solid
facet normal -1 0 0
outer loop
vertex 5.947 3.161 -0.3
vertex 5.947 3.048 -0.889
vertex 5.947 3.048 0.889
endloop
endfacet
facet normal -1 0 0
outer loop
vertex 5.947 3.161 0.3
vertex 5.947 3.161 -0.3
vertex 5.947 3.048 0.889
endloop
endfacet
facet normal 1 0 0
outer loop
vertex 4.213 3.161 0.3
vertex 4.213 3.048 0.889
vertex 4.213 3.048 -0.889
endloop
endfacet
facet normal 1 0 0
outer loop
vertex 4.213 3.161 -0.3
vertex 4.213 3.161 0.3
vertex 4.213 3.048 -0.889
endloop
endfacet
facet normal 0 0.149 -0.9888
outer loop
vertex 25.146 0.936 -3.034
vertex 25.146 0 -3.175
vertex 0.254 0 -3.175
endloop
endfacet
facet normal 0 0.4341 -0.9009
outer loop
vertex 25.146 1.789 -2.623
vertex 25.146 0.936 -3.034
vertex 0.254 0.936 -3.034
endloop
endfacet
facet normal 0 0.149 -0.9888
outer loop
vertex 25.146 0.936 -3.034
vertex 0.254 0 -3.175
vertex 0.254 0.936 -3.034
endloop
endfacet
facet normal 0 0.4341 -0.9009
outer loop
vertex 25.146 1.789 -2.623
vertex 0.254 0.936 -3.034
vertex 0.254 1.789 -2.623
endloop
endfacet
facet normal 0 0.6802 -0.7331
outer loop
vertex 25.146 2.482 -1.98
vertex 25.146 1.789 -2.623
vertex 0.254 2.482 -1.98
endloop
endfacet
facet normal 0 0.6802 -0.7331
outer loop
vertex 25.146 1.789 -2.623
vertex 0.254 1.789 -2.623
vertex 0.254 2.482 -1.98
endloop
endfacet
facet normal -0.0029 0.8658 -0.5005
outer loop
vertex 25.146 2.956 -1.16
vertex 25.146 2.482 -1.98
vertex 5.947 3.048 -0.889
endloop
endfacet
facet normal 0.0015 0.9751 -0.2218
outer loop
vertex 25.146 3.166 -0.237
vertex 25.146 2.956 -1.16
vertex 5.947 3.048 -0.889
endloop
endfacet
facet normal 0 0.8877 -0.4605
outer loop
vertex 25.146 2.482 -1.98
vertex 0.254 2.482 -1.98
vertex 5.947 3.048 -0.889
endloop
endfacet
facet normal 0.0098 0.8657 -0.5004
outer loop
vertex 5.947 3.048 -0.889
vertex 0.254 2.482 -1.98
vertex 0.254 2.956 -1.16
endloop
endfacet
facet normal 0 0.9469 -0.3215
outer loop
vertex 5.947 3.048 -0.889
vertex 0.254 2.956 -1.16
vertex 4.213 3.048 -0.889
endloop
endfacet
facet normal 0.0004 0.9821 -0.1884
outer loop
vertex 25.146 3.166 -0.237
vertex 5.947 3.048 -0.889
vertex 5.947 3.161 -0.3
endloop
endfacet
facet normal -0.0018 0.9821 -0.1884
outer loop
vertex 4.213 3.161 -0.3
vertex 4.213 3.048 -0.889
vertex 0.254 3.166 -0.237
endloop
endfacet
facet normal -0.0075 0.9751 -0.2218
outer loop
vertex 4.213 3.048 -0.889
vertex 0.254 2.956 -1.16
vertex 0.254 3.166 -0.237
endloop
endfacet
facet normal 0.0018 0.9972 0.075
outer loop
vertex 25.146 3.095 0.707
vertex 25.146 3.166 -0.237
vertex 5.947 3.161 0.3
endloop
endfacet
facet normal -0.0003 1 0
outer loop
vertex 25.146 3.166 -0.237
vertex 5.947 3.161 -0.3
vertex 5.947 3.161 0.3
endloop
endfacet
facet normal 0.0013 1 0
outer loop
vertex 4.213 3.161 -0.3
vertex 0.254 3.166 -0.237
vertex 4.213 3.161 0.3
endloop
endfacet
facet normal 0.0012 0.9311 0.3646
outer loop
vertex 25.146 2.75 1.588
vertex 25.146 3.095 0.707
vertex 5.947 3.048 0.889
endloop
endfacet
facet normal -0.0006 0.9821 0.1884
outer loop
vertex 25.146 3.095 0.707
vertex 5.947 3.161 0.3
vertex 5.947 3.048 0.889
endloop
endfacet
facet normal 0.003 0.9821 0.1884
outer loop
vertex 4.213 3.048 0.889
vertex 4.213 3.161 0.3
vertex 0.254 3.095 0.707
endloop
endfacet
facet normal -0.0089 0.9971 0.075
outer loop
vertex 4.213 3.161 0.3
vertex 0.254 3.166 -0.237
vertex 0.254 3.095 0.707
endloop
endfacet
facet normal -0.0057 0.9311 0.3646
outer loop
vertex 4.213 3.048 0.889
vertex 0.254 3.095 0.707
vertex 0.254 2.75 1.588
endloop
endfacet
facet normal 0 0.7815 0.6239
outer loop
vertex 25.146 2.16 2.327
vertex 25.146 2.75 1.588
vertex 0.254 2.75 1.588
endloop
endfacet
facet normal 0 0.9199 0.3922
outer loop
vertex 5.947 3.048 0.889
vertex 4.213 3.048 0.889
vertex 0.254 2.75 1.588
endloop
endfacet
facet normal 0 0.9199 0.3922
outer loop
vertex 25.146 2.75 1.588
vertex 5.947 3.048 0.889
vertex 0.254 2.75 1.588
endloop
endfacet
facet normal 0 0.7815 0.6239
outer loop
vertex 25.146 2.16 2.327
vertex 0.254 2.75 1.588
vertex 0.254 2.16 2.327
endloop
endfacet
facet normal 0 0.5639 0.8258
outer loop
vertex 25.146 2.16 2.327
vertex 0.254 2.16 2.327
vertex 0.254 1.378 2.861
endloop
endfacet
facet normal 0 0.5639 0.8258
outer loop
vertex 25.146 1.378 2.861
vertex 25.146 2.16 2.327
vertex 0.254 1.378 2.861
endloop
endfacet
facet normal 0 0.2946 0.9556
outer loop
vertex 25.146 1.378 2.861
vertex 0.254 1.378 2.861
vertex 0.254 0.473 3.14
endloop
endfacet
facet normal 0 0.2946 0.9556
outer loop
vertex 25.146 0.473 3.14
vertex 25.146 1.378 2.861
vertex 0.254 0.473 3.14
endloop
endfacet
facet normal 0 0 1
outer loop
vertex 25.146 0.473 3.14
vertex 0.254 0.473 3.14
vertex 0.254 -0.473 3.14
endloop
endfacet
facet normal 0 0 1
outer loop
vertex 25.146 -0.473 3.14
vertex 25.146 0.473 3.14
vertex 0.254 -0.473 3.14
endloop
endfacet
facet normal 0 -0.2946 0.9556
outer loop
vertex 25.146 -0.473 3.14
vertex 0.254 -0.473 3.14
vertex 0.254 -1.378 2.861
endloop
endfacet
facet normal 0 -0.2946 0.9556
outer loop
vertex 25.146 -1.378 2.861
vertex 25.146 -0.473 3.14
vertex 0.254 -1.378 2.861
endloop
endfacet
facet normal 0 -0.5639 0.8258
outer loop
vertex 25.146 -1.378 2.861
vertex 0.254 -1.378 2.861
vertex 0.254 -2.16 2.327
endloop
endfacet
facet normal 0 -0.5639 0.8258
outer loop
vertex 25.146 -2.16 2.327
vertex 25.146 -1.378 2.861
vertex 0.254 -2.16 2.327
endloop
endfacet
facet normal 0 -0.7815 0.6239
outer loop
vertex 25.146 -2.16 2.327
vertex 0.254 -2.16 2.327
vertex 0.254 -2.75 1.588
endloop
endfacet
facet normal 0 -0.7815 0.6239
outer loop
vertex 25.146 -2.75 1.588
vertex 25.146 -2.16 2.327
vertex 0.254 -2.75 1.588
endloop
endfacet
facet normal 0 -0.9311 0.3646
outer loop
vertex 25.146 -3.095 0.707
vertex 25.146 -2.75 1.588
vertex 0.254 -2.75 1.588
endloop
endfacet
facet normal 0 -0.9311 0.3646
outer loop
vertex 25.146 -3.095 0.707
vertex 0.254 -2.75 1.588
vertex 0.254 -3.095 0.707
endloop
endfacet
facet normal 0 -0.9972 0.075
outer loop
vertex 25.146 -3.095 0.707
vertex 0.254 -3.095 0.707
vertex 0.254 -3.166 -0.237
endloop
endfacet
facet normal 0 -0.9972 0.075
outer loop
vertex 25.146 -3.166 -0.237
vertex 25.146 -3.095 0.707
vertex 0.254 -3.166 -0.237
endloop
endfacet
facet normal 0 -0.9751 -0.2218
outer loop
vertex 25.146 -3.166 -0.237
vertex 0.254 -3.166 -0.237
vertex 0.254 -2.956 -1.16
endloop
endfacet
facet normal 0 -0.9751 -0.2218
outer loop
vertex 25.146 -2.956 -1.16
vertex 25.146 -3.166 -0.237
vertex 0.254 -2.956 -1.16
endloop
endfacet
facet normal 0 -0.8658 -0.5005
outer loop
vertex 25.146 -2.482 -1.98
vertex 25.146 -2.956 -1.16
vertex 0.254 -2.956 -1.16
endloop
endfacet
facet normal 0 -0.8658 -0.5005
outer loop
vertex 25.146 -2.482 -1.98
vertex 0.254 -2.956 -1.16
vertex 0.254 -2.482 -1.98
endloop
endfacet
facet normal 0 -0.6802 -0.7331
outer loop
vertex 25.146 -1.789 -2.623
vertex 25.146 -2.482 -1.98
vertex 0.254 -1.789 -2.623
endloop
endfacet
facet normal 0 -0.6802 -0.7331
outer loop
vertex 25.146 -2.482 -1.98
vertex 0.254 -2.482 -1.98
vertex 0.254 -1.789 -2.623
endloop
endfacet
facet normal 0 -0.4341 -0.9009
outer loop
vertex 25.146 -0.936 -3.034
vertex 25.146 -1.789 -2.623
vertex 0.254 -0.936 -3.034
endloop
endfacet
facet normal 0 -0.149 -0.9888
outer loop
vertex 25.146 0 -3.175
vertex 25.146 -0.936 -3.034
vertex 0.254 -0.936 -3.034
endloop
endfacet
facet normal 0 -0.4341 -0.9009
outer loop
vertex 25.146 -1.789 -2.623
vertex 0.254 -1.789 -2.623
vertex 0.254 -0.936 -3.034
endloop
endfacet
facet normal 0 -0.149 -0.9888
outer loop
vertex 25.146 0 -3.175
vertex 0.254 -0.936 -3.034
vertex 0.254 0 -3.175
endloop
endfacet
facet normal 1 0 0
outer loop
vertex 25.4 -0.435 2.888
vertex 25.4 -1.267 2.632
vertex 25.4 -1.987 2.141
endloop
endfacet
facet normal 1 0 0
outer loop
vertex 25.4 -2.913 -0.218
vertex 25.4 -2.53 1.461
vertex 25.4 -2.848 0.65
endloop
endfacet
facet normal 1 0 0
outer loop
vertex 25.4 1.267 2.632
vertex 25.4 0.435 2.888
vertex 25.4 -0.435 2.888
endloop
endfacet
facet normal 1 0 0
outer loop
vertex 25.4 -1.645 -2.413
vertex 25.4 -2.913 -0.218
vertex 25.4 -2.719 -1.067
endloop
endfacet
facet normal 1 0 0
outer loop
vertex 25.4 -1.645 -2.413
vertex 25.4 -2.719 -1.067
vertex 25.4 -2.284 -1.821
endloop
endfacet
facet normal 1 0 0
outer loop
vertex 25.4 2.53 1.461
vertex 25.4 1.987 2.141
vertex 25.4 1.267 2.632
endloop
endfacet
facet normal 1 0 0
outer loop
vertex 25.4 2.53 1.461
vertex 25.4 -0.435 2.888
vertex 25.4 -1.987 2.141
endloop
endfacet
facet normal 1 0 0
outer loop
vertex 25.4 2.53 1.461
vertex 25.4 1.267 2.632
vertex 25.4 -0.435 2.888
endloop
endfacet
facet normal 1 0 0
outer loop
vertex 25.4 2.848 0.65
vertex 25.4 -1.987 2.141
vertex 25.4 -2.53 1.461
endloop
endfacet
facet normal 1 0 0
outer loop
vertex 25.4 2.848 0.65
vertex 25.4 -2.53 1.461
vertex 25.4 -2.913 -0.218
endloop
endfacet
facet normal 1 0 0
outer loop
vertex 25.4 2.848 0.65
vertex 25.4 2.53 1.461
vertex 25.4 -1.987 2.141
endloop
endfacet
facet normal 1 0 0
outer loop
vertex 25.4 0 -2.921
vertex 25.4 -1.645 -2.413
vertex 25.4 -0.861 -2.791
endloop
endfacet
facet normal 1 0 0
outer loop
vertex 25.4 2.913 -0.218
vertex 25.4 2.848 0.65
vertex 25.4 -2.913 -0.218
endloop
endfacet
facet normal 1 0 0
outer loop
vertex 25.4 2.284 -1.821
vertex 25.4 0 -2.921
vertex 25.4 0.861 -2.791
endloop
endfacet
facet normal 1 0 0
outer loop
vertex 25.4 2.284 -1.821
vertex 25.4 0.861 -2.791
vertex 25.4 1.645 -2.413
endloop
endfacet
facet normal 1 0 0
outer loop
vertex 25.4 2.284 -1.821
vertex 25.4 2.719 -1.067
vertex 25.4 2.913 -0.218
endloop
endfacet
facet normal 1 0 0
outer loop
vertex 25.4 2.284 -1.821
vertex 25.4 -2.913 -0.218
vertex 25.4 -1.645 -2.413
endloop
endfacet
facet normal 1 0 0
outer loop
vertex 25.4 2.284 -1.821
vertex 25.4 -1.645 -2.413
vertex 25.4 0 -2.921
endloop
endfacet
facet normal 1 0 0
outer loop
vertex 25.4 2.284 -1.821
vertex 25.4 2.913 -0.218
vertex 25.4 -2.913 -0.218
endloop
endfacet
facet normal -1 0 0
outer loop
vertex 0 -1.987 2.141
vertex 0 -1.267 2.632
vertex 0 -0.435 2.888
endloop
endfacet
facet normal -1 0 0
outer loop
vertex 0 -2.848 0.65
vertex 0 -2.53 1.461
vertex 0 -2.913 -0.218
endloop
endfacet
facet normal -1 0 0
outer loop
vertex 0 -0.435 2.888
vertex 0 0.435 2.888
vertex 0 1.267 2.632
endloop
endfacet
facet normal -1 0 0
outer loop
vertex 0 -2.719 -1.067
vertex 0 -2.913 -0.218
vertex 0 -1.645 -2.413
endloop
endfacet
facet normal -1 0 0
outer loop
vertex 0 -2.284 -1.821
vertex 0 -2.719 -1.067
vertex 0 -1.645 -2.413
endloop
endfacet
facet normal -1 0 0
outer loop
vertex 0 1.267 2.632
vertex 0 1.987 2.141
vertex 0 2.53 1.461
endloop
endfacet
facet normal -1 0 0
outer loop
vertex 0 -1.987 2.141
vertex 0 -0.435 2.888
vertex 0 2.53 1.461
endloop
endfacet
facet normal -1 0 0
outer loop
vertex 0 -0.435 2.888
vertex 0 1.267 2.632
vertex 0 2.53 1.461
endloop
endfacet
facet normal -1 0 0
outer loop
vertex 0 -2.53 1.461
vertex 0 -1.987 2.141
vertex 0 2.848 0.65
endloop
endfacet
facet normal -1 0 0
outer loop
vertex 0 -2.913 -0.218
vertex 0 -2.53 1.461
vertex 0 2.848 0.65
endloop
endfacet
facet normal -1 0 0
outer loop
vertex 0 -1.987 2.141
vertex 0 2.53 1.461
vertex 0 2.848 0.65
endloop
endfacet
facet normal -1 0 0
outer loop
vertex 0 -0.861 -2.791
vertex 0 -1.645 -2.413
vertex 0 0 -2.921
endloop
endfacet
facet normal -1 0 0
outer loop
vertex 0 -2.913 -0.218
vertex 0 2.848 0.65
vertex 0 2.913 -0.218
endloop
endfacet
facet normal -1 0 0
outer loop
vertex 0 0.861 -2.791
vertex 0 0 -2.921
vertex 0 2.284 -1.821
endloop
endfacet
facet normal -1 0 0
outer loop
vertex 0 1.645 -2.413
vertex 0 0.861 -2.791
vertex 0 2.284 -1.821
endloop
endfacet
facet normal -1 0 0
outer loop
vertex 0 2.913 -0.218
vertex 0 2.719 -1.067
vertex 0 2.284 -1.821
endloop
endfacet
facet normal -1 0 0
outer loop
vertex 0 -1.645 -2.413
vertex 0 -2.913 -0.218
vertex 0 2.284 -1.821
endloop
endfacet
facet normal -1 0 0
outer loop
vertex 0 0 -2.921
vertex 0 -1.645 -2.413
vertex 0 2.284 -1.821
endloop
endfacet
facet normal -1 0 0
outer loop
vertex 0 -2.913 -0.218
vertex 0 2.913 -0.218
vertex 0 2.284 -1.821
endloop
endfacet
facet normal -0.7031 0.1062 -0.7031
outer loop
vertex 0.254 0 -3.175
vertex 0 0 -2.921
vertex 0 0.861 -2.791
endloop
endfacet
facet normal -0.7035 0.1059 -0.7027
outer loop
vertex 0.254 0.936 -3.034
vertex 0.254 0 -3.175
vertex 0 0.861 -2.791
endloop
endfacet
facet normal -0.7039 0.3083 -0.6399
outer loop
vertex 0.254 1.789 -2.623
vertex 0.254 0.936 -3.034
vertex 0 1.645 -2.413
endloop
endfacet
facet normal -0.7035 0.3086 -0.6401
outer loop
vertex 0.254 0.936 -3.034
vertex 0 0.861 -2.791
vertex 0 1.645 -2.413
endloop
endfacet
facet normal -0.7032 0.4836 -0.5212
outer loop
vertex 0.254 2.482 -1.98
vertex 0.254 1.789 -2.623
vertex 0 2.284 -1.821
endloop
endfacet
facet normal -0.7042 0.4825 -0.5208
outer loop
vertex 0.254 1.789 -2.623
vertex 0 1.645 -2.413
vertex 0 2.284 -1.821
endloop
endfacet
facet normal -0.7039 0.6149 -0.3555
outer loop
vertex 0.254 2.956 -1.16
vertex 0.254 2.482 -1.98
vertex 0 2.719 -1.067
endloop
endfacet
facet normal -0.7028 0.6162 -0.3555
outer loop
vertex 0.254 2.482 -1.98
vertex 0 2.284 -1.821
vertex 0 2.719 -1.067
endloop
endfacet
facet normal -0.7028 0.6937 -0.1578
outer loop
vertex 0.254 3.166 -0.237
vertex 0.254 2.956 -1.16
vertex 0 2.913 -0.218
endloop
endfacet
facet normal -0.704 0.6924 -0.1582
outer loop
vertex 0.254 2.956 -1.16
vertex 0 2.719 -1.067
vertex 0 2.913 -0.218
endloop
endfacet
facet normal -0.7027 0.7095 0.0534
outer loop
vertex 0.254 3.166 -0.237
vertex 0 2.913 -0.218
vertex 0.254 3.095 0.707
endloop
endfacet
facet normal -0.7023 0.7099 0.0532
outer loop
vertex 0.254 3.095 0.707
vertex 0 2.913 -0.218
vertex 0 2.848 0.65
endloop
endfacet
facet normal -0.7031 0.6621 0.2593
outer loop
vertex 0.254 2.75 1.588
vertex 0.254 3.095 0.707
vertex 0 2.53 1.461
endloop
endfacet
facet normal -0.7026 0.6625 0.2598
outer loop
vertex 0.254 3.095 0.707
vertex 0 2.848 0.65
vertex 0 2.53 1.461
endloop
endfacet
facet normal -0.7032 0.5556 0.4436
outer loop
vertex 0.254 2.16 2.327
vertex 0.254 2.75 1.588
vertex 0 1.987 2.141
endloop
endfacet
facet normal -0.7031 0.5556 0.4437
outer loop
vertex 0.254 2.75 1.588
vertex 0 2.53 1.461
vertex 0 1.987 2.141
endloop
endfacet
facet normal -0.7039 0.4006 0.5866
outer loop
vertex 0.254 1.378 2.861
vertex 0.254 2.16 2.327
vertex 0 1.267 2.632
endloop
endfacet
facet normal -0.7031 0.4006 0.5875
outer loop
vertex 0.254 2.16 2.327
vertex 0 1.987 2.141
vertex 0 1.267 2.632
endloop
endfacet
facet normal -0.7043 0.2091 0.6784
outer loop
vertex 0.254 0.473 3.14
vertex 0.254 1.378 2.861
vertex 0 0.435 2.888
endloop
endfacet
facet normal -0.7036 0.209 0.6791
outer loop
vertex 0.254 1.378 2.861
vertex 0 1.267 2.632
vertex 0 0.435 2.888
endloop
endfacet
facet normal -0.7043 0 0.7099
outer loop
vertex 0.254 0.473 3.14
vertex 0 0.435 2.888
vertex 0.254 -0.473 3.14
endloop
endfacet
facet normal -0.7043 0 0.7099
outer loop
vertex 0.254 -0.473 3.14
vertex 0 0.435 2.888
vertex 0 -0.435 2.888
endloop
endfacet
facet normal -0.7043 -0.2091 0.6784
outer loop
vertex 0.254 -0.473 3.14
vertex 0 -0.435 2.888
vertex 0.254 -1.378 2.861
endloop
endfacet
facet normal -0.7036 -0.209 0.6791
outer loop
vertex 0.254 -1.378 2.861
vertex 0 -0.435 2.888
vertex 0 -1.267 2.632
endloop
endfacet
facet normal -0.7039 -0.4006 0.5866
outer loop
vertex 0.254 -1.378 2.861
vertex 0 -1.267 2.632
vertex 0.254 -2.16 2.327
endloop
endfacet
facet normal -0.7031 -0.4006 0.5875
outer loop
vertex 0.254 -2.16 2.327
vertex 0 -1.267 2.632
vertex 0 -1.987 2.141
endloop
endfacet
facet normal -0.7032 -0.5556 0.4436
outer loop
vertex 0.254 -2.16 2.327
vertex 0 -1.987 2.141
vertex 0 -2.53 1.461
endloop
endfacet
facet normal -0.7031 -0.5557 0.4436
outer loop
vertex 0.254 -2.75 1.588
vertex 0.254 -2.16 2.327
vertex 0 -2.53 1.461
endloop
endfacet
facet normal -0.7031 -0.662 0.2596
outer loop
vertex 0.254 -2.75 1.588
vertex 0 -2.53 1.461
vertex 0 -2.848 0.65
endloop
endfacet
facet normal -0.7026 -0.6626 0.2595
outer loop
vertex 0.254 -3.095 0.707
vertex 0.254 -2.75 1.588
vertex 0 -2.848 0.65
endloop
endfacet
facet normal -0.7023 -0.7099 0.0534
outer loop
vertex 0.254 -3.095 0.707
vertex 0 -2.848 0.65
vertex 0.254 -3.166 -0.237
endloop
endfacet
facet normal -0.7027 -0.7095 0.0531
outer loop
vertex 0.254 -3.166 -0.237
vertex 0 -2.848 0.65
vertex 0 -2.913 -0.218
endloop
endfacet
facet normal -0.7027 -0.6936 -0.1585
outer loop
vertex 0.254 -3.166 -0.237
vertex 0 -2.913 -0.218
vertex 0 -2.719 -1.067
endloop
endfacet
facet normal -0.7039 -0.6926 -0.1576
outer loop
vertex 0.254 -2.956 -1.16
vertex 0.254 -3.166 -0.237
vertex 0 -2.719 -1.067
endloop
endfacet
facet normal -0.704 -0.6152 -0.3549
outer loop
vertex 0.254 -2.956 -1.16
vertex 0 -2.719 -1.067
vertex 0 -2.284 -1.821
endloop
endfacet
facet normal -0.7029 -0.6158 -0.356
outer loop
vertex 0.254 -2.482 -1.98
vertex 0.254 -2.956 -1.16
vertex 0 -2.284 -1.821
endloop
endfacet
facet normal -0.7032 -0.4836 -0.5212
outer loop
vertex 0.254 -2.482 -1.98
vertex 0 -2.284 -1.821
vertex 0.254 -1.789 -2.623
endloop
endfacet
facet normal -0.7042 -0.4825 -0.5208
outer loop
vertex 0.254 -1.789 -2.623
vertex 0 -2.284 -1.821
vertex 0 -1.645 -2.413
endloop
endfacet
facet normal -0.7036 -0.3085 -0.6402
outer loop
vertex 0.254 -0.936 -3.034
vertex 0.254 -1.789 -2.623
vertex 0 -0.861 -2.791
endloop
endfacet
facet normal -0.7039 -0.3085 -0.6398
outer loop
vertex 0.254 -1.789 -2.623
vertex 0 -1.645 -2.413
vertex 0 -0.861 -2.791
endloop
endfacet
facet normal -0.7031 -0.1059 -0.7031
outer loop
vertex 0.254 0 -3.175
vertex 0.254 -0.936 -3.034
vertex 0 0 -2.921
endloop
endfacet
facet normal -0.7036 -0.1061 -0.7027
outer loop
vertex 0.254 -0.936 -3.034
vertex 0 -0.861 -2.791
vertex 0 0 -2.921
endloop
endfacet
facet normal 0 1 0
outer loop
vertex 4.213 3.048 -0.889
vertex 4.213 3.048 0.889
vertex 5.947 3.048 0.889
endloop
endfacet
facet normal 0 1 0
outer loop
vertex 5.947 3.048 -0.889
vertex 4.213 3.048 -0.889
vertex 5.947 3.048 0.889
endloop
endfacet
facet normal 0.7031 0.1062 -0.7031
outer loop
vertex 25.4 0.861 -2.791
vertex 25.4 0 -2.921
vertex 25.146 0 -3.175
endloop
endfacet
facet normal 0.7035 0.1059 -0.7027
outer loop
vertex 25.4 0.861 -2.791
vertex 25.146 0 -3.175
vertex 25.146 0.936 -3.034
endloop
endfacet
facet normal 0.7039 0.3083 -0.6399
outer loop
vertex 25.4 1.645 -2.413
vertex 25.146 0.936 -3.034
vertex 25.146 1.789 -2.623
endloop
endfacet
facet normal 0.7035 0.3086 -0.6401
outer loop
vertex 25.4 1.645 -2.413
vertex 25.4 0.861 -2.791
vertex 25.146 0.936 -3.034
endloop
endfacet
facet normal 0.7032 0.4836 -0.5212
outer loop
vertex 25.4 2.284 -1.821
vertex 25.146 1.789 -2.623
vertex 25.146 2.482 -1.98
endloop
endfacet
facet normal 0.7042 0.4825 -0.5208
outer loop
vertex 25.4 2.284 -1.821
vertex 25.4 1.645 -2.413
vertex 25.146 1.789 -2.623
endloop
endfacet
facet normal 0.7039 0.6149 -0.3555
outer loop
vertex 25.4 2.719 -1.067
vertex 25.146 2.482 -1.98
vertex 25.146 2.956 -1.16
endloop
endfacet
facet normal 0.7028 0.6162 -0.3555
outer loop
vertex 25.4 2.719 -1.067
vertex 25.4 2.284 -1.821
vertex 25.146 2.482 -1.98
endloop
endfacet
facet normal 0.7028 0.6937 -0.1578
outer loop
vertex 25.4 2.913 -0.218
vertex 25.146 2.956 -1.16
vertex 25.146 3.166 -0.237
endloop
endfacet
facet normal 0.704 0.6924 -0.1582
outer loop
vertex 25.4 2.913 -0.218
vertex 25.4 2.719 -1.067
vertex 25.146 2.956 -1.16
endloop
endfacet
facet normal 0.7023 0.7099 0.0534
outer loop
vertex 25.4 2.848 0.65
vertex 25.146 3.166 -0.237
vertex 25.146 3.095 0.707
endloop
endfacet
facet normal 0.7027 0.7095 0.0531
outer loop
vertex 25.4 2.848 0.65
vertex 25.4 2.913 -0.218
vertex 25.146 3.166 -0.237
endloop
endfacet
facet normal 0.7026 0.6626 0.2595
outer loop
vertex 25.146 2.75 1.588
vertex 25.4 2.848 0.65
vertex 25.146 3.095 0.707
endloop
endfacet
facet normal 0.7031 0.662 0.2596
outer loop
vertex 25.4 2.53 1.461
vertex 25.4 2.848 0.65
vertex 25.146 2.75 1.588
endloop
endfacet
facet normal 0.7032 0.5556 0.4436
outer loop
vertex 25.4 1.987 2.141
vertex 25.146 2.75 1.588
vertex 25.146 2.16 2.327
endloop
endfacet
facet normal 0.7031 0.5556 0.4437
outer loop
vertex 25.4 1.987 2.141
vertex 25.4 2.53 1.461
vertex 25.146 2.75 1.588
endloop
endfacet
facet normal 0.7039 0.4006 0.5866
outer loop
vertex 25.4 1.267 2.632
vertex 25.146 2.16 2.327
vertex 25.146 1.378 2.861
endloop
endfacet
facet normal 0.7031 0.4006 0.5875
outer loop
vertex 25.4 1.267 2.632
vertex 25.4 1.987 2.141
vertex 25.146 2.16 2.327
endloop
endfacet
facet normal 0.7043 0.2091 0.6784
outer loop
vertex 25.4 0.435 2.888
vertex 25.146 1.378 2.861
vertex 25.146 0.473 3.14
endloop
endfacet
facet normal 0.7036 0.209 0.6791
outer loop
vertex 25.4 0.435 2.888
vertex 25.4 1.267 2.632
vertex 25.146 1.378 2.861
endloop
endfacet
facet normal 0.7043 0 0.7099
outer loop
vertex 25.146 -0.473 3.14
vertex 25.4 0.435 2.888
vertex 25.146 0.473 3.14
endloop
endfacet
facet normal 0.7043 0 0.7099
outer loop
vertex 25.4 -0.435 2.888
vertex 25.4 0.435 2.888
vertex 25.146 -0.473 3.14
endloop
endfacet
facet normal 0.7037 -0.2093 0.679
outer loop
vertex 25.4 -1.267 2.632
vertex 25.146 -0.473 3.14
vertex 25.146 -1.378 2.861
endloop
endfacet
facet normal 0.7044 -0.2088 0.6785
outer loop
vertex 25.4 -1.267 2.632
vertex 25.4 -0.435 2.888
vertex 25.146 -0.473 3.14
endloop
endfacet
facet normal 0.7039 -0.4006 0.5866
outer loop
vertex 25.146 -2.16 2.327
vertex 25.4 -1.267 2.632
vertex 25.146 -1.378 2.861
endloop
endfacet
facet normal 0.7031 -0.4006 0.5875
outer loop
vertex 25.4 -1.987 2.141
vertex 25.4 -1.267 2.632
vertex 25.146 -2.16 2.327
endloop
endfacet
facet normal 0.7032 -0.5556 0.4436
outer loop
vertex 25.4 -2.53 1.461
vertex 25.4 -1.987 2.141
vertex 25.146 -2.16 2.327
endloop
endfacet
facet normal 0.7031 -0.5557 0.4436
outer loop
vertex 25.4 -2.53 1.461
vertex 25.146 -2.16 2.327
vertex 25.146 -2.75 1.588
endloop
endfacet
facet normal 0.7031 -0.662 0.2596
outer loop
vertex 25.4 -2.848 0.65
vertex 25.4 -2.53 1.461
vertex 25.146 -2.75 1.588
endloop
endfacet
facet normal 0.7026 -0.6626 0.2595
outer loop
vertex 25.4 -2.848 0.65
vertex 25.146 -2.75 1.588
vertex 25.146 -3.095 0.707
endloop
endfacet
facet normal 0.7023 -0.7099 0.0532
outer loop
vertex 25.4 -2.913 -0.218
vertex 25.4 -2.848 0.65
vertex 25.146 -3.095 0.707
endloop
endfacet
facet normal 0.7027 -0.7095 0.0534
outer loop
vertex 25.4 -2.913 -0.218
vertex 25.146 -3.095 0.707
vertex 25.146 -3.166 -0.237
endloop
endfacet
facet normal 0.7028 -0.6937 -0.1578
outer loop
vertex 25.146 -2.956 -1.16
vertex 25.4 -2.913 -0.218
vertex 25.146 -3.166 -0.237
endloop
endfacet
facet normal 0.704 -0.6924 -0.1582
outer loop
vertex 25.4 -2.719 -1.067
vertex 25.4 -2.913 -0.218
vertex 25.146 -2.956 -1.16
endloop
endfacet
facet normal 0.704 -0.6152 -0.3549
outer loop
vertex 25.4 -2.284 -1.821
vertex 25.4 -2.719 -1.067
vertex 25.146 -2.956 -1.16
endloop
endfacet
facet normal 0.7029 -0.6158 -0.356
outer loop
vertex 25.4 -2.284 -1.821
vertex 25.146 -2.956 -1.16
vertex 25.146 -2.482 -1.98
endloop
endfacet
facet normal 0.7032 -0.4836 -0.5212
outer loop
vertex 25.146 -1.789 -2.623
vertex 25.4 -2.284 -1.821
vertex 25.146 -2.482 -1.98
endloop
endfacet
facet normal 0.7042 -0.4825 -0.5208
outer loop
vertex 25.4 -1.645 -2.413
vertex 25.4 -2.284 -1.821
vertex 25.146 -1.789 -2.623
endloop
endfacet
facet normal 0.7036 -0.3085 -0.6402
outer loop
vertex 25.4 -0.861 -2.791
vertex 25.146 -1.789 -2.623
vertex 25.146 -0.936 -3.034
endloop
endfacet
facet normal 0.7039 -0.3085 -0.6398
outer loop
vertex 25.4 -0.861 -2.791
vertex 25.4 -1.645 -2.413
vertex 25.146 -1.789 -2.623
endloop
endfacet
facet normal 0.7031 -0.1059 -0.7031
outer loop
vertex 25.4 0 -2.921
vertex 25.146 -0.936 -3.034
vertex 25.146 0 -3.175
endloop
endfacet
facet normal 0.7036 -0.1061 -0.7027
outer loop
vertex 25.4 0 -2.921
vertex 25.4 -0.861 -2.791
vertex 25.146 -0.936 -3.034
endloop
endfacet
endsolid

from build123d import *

# Parameters (mm, degrees)
SKETCH2_R               = 3.175
BOSS_EXTRUDE1_DEPTH     = 25.4
CHAMFER1_SIZE           = 0.254
SKETCH3_W               = 1.733713748
SKETCH3_H               = 3.25599899
CUT_EXTRUDE1_DEPTH      = 4.175
CUT_EXTRUDE1_DEPTH_BACK = 4.175


with BuildPart() as part:
    # Sketch2 → Boss-Extrude1 (new body)
    with BuildSketch(Plane(origin=(0, 0, 0), x_dir=(0, 0, -1), z_dir=(1, 0, 0))):
        Circle(SKETCH2_R)
    extrude(amount=BOSS_EXTRUDE1_DEPTH)

    # Chamfer1
    chamfer1_edges = [part.edges().sort_by_distance(p)[0] for p in [
        (0, 0, 3.175),
        (25.4, 0, 3.175),
    ]]
    chamfer(chamfer1_edges, length=CHAMFER1_SIZE)

    # Sketch3 → Cut-Extrude1 (cut, two sides)
    with BuildSketch(Plane.XY) as cut_extrude1_sk:
        with Locations((5.08, 4.675999495)):
            Rectangle(SKETCH3_W, SKETCH3_H)
    extrude(amount=CUT_EXTRUDE1_DEPTH, mode=Mode.SUBTRACT)
    extrude(cut_extrude1_sk.sketch, amount=-CUT_EXTRUDE1_DEPTH_BACK, mode=Mode.SUBTRACT)


solid = part.part
